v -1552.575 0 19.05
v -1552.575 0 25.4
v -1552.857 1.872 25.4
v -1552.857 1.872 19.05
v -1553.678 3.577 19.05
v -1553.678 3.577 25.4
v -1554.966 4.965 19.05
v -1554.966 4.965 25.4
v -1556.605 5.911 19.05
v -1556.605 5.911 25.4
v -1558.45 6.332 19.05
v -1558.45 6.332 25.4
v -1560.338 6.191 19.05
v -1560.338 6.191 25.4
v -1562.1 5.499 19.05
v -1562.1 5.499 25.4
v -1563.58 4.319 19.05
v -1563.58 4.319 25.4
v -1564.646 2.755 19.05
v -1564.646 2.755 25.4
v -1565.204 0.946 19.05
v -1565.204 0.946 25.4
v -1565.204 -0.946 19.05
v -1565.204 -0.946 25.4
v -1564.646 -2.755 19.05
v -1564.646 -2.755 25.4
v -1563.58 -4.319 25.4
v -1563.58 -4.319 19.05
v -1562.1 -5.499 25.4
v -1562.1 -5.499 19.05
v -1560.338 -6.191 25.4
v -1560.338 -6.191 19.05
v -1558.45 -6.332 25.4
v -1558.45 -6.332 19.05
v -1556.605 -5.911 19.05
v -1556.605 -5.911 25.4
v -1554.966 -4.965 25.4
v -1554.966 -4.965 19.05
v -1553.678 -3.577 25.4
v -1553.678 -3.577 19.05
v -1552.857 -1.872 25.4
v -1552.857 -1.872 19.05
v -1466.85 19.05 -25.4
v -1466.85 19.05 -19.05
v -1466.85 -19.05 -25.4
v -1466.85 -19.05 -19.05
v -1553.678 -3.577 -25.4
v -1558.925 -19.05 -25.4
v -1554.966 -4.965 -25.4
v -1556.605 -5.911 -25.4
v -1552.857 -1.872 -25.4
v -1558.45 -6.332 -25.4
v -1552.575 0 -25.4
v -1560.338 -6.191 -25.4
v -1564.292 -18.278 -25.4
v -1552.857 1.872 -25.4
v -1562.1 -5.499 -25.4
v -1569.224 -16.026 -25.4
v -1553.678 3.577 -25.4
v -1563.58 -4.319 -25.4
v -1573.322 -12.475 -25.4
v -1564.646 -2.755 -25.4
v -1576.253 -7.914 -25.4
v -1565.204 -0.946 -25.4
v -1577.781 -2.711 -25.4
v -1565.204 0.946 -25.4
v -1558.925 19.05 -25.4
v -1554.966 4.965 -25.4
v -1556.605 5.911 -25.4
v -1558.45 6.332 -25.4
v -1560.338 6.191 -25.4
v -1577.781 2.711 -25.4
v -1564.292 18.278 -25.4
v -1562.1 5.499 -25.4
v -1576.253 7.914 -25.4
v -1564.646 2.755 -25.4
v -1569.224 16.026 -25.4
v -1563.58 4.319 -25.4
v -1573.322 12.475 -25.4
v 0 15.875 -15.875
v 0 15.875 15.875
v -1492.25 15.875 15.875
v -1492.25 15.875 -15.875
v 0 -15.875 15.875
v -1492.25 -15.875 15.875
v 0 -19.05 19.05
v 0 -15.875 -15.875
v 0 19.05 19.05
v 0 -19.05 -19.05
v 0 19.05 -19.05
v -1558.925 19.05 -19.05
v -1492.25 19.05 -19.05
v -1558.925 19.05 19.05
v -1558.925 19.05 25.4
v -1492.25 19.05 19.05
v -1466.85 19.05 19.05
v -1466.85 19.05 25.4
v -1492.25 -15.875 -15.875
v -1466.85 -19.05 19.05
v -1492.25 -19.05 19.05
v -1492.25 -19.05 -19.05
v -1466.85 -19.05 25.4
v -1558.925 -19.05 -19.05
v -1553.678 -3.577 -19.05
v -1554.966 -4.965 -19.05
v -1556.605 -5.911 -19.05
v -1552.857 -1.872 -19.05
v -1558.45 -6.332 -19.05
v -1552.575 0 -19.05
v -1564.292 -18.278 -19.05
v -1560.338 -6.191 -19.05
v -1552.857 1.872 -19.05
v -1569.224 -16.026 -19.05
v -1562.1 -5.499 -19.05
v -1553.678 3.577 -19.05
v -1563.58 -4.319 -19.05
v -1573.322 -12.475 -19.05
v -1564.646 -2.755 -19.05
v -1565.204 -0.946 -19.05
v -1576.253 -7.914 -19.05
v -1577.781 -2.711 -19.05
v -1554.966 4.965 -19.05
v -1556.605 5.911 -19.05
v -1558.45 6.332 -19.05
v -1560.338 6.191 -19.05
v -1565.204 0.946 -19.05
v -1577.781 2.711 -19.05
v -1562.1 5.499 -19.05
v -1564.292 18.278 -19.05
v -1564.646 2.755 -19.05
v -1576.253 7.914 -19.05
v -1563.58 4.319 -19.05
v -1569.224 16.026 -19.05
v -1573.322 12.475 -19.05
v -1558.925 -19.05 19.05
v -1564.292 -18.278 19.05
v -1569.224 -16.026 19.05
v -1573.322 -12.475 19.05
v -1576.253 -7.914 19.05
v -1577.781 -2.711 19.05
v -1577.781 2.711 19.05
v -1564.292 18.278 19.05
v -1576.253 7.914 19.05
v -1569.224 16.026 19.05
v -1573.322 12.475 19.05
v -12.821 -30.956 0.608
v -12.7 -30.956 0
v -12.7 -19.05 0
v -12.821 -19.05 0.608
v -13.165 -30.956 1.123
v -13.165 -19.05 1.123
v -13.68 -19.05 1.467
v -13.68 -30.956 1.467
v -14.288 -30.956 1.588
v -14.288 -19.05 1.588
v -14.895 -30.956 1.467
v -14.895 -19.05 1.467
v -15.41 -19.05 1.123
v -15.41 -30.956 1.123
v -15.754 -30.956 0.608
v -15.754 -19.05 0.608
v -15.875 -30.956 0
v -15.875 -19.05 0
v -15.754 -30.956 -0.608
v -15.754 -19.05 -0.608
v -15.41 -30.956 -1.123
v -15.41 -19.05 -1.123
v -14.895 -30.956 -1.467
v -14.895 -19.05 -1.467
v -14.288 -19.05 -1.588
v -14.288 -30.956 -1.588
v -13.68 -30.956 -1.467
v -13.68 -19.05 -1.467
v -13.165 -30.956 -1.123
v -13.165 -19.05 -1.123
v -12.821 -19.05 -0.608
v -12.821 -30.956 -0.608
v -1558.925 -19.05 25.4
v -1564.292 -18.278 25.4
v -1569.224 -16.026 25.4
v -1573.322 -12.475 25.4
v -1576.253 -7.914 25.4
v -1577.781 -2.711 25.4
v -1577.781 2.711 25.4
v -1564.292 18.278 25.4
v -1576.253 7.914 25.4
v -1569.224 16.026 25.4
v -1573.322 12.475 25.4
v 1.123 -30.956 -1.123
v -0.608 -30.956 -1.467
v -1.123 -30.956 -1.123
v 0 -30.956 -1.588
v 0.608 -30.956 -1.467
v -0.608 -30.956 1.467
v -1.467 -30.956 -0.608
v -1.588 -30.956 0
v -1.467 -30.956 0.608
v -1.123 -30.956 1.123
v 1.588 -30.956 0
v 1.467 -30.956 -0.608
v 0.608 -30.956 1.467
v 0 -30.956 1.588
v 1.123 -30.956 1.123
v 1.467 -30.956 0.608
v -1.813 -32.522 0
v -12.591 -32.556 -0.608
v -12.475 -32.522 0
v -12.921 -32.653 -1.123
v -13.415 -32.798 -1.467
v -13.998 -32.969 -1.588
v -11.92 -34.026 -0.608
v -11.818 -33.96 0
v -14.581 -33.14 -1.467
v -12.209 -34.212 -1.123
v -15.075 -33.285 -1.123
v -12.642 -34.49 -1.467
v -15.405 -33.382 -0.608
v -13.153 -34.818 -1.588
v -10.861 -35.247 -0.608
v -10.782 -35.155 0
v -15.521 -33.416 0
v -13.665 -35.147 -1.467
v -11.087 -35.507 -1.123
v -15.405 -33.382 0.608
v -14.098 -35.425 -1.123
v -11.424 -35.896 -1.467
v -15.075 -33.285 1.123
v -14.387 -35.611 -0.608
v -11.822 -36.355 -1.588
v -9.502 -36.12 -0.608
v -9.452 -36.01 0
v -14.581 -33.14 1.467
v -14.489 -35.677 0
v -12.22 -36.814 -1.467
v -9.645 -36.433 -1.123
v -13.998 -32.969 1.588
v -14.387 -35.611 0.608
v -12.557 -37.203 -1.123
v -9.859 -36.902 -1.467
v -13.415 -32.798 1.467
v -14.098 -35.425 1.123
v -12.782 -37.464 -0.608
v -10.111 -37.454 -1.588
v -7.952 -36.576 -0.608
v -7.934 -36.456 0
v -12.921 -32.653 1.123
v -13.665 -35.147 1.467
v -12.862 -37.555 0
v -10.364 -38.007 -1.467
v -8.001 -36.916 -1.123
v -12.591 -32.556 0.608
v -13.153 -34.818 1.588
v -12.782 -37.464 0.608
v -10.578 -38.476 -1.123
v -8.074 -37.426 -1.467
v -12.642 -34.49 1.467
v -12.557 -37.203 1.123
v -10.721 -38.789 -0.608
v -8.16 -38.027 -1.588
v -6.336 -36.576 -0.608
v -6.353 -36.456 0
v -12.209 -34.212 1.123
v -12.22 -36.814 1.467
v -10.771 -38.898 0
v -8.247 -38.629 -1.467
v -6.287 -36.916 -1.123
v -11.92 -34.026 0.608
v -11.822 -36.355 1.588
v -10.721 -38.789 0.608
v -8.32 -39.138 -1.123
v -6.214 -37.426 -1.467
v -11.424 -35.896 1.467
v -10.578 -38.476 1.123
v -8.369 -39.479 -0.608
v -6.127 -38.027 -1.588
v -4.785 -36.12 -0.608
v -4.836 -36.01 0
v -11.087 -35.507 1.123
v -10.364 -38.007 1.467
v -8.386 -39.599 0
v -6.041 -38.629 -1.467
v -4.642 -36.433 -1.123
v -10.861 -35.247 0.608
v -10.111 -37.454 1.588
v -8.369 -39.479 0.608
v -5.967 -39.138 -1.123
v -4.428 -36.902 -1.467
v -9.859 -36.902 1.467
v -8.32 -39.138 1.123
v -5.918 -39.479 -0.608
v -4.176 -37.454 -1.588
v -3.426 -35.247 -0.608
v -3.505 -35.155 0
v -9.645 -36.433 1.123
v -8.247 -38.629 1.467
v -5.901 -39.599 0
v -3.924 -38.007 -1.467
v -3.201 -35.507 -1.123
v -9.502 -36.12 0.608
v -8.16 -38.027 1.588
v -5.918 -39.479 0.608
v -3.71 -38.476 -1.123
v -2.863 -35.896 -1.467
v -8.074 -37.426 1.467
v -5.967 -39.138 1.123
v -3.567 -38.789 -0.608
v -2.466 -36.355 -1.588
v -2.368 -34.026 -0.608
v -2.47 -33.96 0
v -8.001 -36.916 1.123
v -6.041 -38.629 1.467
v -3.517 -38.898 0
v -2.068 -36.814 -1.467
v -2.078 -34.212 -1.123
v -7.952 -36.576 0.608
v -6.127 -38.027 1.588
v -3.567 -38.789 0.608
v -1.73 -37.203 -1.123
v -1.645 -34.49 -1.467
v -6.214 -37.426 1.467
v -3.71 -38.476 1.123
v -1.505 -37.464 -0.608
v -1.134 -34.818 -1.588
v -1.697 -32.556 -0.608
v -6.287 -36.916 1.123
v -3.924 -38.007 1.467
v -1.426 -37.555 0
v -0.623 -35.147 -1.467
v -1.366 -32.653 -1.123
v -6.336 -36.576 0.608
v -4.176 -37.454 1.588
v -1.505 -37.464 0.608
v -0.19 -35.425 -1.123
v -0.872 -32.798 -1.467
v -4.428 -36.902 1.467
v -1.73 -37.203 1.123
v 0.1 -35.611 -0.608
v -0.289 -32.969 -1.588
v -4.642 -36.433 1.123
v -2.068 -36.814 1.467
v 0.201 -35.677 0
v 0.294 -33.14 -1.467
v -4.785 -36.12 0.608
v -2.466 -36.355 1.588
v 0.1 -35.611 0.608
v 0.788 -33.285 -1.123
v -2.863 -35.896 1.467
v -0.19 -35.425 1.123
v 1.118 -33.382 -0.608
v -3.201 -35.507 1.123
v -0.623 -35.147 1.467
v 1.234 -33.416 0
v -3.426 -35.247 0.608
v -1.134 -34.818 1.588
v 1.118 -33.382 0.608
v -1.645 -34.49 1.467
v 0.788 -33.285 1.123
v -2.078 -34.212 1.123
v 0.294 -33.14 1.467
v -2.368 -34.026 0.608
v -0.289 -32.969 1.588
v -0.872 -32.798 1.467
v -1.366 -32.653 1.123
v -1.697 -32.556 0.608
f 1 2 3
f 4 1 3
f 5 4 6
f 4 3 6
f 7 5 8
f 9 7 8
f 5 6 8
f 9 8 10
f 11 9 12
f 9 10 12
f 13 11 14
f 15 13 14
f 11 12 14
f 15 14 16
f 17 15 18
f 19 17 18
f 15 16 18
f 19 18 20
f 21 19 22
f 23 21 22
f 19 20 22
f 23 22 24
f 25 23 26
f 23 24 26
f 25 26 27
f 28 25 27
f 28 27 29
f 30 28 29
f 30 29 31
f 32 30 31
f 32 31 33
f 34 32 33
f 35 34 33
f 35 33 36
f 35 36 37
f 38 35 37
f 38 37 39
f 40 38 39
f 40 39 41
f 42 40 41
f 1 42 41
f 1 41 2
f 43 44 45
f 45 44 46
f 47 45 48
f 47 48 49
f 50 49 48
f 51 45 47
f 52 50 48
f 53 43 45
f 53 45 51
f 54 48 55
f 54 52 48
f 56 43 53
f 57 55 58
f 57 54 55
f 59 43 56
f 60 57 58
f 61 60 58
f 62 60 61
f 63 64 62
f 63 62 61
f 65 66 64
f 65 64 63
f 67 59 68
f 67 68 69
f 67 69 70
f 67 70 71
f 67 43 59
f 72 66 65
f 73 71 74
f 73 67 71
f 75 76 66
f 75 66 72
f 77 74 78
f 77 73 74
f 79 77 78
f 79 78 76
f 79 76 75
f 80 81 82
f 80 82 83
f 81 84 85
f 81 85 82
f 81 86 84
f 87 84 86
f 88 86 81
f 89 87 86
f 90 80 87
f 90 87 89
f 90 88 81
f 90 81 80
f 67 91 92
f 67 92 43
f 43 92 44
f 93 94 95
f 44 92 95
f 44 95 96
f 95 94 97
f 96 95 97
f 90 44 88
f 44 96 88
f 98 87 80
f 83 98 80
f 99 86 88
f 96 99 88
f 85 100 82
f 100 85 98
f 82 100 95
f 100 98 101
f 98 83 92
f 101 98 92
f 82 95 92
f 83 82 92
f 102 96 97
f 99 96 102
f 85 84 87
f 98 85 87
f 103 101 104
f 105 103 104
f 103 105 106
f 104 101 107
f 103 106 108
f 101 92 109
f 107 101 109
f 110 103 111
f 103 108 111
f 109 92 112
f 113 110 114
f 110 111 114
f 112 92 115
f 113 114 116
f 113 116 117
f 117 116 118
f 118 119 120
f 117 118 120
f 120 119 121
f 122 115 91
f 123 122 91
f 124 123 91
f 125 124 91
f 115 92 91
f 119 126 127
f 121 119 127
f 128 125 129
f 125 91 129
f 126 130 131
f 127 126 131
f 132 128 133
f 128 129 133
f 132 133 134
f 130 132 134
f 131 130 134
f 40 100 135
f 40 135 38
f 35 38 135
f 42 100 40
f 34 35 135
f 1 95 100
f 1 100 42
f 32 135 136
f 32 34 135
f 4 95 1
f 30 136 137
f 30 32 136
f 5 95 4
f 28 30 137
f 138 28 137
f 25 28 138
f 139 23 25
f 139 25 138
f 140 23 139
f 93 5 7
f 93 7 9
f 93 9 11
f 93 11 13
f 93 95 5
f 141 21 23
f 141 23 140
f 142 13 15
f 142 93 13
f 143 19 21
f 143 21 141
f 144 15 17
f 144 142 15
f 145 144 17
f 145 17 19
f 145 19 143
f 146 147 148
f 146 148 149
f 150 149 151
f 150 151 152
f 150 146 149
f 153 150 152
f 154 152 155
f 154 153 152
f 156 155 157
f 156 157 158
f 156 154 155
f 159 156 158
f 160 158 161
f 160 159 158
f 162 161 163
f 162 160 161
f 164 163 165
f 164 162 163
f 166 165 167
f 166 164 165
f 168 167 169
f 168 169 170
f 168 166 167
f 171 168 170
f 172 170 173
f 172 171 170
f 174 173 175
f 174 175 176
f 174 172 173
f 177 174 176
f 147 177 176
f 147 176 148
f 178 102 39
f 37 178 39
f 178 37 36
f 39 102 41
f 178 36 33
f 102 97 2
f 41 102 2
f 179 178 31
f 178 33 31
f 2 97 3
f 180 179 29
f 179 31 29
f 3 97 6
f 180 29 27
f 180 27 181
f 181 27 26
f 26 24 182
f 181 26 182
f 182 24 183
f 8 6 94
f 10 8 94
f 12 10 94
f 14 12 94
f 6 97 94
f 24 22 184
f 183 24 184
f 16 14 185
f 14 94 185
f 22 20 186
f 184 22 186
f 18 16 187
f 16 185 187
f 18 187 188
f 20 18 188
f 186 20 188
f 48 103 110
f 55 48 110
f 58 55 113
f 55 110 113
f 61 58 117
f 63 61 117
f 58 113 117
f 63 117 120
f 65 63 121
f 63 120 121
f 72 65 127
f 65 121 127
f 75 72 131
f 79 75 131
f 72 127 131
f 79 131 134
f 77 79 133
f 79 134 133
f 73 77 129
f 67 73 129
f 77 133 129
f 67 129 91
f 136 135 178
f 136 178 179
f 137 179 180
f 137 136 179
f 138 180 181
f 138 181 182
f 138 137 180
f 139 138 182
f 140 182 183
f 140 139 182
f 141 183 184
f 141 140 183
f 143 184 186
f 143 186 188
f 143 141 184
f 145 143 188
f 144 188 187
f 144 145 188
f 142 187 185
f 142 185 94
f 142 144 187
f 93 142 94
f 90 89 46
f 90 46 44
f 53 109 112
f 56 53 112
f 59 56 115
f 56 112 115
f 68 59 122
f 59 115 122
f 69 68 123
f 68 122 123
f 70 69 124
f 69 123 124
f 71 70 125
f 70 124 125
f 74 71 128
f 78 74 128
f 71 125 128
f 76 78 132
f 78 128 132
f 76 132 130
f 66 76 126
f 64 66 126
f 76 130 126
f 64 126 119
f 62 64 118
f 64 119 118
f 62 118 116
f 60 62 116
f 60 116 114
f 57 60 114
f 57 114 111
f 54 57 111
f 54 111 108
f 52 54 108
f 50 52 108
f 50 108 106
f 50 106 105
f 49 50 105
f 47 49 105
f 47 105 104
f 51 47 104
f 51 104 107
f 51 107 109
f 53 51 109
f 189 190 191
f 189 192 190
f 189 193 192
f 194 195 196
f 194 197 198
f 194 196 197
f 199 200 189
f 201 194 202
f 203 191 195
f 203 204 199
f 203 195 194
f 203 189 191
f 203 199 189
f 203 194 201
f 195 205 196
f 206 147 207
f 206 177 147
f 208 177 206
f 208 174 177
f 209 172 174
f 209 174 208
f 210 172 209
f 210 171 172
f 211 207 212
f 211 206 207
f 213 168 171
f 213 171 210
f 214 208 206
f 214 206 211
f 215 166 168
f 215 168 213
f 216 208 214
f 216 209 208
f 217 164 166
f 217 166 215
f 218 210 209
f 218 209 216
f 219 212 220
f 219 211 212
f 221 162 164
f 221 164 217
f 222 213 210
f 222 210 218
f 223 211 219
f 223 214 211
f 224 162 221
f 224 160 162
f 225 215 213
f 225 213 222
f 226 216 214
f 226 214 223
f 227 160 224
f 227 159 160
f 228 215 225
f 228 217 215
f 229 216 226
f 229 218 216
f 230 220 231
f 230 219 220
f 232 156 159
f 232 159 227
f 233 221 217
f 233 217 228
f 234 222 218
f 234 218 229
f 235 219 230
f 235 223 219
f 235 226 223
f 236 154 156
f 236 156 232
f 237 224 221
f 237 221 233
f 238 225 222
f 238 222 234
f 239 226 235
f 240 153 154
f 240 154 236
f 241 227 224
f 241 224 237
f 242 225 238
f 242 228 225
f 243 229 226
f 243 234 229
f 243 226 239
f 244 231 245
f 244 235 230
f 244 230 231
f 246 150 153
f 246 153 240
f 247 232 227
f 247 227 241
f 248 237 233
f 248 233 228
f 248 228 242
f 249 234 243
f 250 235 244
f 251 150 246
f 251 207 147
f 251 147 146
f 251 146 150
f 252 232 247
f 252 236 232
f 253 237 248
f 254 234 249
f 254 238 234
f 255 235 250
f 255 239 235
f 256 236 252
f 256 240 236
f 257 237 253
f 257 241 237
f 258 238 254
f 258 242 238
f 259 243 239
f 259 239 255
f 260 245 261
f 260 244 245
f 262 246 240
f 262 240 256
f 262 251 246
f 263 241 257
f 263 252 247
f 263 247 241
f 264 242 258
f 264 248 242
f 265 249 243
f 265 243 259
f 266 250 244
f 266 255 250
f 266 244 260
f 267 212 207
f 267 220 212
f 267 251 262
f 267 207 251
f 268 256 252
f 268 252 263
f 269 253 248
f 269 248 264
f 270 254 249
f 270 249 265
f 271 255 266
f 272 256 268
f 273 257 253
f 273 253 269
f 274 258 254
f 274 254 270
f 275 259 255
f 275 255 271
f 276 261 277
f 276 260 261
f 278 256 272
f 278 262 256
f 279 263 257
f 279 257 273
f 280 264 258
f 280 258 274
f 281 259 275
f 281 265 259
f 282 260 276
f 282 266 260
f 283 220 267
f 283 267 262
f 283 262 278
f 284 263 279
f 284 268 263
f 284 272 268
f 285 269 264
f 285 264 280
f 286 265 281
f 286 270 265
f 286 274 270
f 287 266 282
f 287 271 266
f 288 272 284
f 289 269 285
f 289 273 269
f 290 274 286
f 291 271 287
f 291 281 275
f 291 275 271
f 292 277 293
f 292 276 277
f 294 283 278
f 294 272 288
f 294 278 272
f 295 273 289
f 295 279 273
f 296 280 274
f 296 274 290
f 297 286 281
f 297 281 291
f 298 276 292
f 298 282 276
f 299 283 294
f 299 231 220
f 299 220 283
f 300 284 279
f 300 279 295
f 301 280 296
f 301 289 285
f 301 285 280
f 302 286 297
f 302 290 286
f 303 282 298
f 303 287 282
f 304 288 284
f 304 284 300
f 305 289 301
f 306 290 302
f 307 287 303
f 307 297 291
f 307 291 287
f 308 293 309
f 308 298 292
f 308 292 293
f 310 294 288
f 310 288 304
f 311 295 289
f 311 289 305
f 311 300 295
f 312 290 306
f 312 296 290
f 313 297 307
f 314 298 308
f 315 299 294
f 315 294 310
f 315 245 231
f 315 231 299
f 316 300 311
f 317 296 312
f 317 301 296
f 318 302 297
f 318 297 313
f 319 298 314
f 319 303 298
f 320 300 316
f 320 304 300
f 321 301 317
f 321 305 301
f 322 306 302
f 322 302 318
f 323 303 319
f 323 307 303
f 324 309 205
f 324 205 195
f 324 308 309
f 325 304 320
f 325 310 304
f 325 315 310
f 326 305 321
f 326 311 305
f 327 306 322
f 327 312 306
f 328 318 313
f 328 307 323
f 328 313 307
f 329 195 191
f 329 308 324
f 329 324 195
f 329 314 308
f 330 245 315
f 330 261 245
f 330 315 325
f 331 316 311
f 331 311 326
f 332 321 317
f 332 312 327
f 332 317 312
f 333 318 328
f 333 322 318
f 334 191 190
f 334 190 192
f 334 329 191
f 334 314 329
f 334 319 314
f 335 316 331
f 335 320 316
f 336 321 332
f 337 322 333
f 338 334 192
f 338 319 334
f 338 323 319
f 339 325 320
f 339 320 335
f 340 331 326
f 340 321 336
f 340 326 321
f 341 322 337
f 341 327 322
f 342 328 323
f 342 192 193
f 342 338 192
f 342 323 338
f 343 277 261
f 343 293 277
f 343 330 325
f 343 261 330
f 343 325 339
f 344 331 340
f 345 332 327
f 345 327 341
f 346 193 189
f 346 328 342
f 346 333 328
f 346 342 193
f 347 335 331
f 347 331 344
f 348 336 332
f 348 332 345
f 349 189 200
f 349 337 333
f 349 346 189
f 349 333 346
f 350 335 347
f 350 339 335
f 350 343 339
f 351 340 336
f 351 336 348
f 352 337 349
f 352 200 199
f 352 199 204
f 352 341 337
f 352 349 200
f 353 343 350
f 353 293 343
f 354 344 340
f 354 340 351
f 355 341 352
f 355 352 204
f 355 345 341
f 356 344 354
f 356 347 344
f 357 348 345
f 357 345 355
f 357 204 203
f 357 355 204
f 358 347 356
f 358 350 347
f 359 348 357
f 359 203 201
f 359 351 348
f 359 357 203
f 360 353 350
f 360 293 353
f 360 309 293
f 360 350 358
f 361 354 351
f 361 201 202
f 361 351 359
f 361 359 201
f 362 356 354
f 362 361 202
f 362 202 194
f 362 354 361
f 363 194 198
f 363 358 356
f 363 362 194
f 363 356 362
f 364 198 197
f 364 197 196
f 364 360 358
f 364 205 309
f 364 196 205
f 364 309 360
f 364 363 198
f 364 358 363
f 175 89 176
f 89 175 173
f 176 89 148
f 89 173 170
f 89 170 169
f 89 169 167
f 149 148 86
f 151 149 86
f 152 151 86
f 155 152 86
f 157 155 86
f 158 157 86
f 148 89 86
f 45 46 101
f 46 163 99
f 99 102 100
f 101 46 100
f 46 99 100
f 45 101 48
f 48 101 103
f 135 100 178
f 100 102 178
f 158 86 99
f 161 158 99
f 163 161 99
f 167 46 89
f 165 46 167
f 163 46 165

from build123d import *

# Parameters (mm, degrees)
SKETCH2_W           = 38.1
SKETCH2_H           = 38.1
BOSS_EXTRUDE1_DEPTH = 1492.25
SHELL1_T            = -3.175
BOSS_EXTRUDE2_DEPTH = 6.35
SKETCH4_R           = 6.35
CUT_EXTRUDE1_DEPTH  = 1579.907420695
SKETCH7_R           = 1.5875


with BuildPart() as part:
    # Sketch2 → Boss-Extrude1 (new body)
    with BuildSketch(Plane(origin=(0, 0, 0), x_dir=(0, 0, -1), z_dir=(1, 0, 0))):
        Rectangle(SKETCH2_W, SKETCH2_H)
    extrude(amount=-BOSS_EXTRUDE1_DEPTH)

    # Shell1
    shell1_openings = [part.faces().sort_by_distance(p)[0] for p in [
        (-1492.25, 0, 0),
        (0, 0, 0),
    ]]
    offset(amount=SHELL1_T, openings=shell1_openings, kind=Kind.INTERSECTION)

    # Sketch3 → Boss-Extrude2 (add)
    with BuildSketch(Plane.XY.offset(19.05)):
        with BuildLine():
            Line((-1492.25, 19.05), (-1466.85, 19.05))
            Line((-1466.85, 19.05), (-1466.85, -19.05))
            Line((-1466.85, -19.05), (-1492.25, -19.05))
            Line((-1492.25, -19.05), (-1558.925, -19.05))
            ThreePointArc((-1558.925, -19.05), (-1577.975, 0), (-1558.925, 19.05))
            Line((-1558.925, 19.05), (-1492.25, 19.05))
        make_face()
    boss_extrude2 = extrude(amount=BOSS_EXTRUDE2_DEPTH)

    # Mirror1: Boss-Extrude2 across plane
    add(boss_extrude2.mirror(Plane.XY))

    # Sketch4 → Cut-Extrude1 (cut, through all)
    with BuildSketch(Plane.XY.offset(25.4)):
        with Locations((-1558.925, 0)):
            Circle(SKETCH4_R)
    extrude(amount=-CUT_EXTRUDE1_DEPTH, mode=Mode.SUBTRACT)

    # Sweep1: sweep along a path in Sketch5
    with BuildLine(Plane.XY) as sweep1_path:
        Line((-14.2875, -19.05), (-14.2875, -30.95625))
        ThreePointArc((-14.2875, -30.95625), (-7.14375, -38.1), (0, -30.95625))
    # Sketch7 → Sweep1 (sweep)
    with BuildSketch(Plane.XZ.offset(19.05)):
        with Locations((-14.2875, 0)):
            Circle(SKETCH7_R)
    sweep(path=sweep1_path.line)


solid = part.part
